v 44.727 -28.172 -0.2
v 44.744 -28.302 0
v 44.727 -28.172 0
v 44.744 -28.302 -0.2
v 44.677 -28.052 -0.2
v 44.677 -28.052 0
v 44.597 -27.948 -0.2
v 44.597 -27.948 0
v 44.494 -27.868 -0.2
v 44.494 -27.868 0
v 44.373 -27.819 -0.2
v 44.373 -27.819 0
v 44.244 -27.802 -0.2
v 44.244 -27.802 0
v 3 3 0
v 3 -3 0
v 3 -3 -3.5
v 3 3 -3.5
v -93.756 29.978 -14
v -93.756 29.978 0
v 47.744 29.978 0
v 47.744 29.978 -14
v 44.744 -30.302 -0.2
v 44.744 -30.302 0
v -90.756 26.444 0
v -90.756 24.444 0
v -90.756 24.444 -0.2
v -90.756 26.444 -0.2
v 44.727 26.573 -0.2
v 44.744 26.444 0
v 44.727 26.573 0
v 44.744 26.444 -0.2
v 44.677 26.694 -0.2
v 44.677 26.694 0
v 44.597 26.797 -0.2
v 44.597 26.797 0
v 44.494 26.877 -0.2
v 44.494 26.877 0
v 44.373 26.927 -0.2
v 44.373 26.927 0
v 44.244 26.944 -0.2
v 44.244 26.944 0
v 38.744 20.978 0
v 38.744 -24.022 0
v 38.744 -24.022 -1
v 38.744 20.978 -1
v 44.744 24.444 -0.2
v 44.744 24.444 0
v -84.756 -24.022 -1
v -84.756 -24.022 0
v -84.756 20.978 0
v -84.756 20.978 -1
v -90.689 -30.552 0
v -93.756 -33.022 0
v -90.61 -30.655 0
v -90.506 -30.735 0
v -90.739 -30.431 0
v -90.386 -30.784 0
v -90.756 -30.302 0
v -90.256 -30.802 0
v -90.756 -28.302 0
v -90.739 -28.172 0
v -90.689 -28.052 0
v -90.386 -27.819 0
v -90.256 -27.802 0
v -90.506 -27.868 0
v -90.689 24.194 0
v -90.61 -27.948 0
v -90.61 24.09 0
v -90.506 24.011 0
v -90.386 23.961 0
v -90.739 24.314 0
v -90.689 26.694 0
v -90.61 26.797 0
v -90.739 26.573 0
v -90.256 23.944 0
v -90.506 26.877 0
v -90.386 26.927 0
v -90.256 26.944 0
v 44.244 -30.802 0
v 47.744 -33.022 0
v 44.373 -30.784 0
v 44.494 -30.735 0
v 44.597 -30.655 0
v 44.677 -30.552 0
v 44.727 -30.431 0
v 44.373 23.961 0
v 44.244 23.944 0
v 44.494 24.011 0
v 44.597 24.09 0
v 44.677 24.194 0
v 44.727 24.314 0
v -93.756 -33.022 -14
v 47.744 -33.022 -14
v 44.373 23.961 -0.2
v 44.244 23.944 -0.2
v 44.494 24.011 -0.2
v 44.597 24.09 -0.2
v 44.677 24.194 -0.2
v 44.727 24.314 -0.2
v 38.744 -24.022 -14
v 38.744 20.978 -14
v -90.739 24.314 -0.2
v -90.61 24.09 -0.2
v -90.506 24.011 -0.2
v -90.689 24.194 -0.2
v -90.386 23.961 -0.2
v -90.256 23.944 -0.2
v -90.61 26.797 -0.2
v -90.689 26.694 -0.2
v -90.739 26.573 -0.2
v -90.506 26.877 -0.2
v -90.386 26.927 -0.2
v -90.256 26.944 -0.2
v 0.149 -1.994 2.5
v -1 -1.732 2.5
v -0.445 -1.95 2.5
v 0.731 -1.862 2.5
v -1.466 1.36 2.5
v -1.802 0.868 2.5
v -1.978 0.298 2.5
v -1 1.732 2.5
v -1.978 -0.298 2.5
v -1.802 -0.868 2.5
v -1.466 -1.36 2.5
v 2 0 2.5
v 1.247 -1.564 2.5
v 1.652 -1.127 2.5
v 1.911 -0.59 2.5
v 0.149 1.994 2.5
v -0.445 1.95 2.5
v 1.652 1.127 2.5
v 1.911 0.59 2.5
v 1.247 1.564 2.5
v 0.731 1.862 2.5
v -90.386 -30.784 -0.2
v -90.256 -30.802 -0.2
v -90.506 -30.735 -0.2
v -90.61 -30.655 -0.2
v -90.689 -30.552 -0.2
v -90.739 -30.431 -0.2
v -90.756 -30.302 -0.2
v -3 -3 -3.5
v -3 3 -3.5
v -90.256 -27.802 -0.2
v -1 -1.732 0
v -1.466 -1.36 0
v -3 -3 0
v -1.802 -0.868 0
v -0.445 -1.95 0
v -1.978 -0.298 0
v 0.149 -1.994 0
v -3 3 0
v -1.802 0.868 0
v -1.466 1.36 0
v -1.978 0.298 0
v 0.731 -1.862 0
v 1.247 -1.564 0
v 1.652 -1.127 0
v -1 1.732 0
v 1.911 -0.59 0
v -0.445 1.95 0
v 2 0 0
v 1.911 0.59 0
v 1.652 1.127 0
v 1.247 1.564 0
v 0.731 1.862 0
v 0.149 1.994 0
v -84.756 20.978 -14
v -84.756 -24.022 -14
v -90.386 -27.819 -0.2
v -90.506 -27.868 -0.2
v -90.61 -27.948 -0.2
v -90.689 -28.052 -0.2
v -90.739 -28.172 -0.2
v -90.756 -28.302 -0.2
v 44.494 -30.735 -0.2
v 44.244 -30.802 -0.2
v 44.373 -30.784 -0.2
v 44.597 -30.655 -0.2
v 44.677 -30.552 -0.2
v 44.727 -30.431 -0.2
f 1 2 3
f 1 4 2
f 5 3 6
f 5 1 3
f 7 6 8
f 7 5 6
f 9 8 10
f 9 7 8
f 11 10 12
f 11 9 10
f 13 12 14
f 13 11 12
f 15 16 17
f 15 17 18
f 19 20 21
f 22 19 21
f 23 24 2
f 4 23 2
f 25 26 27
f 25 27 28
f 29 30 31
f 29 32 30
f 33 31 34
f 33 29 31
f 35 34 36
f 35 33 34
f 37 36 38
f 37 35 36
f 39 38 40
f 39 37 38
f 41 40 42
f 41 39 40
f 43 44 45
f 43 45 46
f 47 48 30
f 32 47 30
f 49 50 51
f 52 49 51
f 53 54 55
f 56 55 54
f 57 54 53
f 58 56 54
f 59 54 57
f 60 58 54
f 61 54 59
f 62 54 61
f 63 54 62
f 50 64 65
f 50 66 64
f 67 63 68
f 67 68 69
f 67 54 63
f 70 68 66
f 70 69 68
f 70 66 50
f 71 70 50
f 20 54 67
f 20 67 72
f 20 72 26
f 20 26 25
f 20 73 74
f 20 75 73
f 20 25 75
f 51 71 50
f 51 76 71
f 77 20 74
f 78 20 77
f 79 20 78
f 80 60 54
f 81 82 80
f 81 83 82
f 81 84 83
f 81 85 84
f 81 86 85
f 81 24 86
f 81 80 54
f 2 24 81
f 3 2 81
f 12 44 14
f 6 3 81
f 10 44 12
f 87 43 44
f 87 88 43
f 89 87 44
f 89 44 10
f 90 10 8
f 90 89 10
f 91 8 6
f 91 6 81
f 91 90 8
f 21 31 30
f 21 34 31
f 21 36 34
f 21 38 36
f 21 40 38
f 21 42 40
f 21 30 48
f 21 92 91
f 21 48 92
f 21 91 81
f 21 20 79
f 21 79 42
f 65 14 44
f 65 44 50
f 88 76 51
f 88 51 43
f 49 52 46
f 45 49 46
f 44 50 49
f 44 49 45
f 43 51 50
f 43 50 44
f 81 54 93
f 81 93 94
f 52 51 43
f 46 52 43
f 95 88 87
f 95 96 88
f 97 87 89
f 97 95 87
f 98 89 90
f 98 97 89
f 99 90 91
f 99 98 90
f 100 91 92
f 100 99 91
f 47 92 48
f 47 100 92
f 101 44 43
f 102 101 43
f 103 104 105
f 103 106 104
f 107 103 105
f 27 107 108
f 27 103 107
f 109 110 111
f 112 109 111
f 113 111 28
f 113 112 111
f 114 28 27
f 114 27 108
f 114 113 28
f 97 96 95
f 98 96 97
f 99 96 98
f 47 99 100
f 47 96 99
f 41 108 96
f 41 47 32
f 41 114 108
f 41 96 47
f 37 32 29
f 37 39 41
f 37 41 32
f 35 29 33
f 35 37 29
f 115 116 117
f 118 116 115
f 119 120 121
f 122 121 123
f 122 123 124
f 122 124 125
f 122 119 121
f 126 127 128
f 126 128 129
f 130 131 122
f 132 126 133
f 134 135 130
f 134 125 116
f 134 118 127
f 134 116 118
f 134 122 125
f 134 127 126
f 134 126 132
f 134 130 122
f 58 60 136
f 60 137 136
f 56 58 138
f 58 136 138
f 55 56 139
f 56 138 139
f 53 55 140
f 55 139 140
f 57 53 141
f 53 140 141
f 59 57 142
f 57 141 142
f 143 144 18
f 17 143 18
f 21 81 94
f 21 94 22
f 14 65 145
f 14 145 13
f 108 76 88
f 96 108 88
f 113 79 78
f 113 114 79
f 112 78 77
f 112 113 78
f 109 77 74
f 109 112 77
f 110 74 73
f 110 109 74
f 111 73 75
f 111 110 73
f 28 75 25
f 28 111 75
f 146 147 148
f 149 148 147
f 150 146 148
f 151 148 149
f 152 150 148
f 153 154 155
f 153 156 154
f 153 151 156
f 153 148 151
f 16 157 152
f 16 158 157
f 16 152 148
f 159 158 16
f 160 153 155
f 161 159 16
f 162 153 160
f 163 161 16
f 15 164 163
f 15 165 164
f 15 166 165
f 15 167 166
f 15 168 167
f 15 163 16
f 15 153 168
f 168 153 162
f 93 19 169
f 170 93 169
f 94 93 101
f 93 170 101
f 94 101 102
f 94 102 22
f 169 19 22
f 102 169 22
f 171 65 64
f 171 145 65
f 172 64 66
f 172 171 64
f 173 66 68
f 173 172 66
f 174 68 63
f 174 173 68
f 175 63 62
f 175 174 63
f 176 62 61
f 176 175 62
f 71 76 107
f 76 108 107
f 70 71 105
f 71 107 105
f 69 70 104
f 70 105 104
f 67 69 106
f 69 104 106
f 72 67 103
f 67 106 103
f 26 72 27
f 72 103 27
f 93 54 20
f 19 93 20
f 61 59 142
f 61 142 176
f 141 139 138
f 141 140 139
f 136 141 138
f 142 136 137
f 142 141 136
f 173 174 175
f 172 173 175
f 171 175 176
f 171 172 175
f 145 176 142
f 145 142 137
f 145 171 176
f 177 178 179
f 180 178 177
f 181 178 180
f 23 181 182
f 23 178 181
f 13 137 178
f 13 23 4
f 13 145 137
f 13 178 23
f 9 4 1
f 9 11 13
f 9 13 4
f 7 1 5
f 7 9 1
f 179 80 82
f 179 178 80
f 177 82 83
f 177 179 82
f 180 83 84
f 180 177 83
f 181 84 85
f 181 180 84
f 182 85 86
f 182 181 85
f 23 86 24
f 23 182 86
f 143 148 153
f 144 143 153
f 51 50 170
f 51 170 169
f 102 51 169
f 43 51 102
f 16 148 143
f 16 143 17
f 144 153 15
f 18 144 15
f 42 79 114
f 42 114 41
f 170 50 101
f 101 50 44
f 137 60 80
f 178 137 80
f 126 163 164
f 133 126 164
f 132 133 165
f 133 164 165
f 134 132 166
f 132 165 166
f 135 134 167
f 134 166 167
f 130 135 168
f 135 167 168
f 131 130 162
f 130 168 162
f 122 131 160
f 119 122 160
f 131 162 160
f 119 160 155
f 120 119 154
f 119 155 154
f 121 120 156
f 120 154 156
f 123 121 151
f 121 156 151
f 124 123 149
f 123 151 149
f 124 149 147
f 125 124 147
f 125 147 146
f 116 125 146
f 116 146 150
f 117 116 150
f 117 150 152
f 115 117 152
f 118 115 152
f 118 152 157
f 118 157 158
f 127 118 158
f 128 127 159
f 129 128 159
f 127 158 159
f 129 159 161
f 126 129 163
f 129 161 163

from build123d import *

# Parameters (mm, degrees)
F0_W      = 6
F0_H      = 6
F1_DEPTH  = 3.5
F2_R      = 2
F3_DEPTH  = 2.5
F4_W      = 123.5
F4_H      = 45
F5_DEPTH  = 14
F6_W      = 141.5
F6_H      = 63
F6_W_2    = 123.5
F6_H_2    = 45
F7_DEPTH  = 14
F8_DEPTH  = 14
F9_DEPTH  = 1
F10_W     = 135.5
F10_H     = 3
F11_DEPTH = 0.2
F12_R     = 0.5


with BuildPart() as f1:
    # F0 (on Top) → F1 (new body)
    with BuildSketch(Plane.XY):
        Rectangle(F0_W, F0_H)
    extrude(amount=-F1_DEPTH)

    # F2 (on face) → F3 (join)
    with BuildSketch(Plane.XY):
        Circle(F2_R)
    extrude(amount=F3_DEPTH)


with BuildPart() as f5:
    # F4 (on Top) → F5 (new body)
    with BuildSketch(Plane.XY):
        with Locations((-23.006114117, -1.52229378)):
            Rectangle(F4_W, F4_H)
    extrude(amount=-F5_DEPTH)

    # F6 (on face) → F7 (join)
    with BuildSketch(Plane.XY):
        with Locations((-23.006114117, -1.52229378)):
            Rectangle(F6_W, F6_H)
        with Locations((-23.006114117, -1.52229378)):
            Rectangle(F6_W_2, F6_H_2, mode=Mode.SUBTRACT)
    extrude(amount=-F7_DEPTH)

    # F2 (on face) + F4 (on Top) → F8 (cut)
    with BuildSketch(Plane.XY):
        Circle(F2_R)
    with BuildSketch(Plane.XY):
        with Locations((-23.006114117, -1.52229378)):
            Rectangle(F4_W, F4_H)
    extrude(amount=-F8_DEPTH, mode=Mode.SUBTRACT)

    # F10 (on face) → F11 (cut)
    with BuildSketch(Plane.XY):
        with Locations((-23.006114117, 25.443688035)):
            Rectangle(F10_W, F10_H)
        with Locations((-23.006114117, -29.3015043586)):
            Rectangle(F10_W, F10_H)
    extrude(amount=-F11_DEPTH, mode=Mode.SUBTRACT)

    # F12
    f12_edges = [f5.edges().sort_by_distance(p)[0] for p in [
        (-90.756114, 26.943688, -0.1),
        (-90.756114, 23.943688, -0.1),
        (44.743886, 23.943688, -0.1),
        (44.743886, 26.943688, -0.1),
        (-90.756114, -27.801504, -0.1),
        (-90.756114, -30.801504, -0.1),
        (44.743886, -27.801504, -0.1),
        (44.743886, -30.801504, -0.1),
    ]]
    fillet(f12_edges, radius=F12_R)


with BuildPart() as f9:
    # F4 (on Top) → F9 (new body)
    with BuildSketch(Plane.XY):
        with Locations((-23.006114117, -1.52229378)):
            Rectangle(F4_W, F4_H)
    extrude(amount=-F9_DEPTH)


solid = Compound([f1.part, f5.part, f9.part])
